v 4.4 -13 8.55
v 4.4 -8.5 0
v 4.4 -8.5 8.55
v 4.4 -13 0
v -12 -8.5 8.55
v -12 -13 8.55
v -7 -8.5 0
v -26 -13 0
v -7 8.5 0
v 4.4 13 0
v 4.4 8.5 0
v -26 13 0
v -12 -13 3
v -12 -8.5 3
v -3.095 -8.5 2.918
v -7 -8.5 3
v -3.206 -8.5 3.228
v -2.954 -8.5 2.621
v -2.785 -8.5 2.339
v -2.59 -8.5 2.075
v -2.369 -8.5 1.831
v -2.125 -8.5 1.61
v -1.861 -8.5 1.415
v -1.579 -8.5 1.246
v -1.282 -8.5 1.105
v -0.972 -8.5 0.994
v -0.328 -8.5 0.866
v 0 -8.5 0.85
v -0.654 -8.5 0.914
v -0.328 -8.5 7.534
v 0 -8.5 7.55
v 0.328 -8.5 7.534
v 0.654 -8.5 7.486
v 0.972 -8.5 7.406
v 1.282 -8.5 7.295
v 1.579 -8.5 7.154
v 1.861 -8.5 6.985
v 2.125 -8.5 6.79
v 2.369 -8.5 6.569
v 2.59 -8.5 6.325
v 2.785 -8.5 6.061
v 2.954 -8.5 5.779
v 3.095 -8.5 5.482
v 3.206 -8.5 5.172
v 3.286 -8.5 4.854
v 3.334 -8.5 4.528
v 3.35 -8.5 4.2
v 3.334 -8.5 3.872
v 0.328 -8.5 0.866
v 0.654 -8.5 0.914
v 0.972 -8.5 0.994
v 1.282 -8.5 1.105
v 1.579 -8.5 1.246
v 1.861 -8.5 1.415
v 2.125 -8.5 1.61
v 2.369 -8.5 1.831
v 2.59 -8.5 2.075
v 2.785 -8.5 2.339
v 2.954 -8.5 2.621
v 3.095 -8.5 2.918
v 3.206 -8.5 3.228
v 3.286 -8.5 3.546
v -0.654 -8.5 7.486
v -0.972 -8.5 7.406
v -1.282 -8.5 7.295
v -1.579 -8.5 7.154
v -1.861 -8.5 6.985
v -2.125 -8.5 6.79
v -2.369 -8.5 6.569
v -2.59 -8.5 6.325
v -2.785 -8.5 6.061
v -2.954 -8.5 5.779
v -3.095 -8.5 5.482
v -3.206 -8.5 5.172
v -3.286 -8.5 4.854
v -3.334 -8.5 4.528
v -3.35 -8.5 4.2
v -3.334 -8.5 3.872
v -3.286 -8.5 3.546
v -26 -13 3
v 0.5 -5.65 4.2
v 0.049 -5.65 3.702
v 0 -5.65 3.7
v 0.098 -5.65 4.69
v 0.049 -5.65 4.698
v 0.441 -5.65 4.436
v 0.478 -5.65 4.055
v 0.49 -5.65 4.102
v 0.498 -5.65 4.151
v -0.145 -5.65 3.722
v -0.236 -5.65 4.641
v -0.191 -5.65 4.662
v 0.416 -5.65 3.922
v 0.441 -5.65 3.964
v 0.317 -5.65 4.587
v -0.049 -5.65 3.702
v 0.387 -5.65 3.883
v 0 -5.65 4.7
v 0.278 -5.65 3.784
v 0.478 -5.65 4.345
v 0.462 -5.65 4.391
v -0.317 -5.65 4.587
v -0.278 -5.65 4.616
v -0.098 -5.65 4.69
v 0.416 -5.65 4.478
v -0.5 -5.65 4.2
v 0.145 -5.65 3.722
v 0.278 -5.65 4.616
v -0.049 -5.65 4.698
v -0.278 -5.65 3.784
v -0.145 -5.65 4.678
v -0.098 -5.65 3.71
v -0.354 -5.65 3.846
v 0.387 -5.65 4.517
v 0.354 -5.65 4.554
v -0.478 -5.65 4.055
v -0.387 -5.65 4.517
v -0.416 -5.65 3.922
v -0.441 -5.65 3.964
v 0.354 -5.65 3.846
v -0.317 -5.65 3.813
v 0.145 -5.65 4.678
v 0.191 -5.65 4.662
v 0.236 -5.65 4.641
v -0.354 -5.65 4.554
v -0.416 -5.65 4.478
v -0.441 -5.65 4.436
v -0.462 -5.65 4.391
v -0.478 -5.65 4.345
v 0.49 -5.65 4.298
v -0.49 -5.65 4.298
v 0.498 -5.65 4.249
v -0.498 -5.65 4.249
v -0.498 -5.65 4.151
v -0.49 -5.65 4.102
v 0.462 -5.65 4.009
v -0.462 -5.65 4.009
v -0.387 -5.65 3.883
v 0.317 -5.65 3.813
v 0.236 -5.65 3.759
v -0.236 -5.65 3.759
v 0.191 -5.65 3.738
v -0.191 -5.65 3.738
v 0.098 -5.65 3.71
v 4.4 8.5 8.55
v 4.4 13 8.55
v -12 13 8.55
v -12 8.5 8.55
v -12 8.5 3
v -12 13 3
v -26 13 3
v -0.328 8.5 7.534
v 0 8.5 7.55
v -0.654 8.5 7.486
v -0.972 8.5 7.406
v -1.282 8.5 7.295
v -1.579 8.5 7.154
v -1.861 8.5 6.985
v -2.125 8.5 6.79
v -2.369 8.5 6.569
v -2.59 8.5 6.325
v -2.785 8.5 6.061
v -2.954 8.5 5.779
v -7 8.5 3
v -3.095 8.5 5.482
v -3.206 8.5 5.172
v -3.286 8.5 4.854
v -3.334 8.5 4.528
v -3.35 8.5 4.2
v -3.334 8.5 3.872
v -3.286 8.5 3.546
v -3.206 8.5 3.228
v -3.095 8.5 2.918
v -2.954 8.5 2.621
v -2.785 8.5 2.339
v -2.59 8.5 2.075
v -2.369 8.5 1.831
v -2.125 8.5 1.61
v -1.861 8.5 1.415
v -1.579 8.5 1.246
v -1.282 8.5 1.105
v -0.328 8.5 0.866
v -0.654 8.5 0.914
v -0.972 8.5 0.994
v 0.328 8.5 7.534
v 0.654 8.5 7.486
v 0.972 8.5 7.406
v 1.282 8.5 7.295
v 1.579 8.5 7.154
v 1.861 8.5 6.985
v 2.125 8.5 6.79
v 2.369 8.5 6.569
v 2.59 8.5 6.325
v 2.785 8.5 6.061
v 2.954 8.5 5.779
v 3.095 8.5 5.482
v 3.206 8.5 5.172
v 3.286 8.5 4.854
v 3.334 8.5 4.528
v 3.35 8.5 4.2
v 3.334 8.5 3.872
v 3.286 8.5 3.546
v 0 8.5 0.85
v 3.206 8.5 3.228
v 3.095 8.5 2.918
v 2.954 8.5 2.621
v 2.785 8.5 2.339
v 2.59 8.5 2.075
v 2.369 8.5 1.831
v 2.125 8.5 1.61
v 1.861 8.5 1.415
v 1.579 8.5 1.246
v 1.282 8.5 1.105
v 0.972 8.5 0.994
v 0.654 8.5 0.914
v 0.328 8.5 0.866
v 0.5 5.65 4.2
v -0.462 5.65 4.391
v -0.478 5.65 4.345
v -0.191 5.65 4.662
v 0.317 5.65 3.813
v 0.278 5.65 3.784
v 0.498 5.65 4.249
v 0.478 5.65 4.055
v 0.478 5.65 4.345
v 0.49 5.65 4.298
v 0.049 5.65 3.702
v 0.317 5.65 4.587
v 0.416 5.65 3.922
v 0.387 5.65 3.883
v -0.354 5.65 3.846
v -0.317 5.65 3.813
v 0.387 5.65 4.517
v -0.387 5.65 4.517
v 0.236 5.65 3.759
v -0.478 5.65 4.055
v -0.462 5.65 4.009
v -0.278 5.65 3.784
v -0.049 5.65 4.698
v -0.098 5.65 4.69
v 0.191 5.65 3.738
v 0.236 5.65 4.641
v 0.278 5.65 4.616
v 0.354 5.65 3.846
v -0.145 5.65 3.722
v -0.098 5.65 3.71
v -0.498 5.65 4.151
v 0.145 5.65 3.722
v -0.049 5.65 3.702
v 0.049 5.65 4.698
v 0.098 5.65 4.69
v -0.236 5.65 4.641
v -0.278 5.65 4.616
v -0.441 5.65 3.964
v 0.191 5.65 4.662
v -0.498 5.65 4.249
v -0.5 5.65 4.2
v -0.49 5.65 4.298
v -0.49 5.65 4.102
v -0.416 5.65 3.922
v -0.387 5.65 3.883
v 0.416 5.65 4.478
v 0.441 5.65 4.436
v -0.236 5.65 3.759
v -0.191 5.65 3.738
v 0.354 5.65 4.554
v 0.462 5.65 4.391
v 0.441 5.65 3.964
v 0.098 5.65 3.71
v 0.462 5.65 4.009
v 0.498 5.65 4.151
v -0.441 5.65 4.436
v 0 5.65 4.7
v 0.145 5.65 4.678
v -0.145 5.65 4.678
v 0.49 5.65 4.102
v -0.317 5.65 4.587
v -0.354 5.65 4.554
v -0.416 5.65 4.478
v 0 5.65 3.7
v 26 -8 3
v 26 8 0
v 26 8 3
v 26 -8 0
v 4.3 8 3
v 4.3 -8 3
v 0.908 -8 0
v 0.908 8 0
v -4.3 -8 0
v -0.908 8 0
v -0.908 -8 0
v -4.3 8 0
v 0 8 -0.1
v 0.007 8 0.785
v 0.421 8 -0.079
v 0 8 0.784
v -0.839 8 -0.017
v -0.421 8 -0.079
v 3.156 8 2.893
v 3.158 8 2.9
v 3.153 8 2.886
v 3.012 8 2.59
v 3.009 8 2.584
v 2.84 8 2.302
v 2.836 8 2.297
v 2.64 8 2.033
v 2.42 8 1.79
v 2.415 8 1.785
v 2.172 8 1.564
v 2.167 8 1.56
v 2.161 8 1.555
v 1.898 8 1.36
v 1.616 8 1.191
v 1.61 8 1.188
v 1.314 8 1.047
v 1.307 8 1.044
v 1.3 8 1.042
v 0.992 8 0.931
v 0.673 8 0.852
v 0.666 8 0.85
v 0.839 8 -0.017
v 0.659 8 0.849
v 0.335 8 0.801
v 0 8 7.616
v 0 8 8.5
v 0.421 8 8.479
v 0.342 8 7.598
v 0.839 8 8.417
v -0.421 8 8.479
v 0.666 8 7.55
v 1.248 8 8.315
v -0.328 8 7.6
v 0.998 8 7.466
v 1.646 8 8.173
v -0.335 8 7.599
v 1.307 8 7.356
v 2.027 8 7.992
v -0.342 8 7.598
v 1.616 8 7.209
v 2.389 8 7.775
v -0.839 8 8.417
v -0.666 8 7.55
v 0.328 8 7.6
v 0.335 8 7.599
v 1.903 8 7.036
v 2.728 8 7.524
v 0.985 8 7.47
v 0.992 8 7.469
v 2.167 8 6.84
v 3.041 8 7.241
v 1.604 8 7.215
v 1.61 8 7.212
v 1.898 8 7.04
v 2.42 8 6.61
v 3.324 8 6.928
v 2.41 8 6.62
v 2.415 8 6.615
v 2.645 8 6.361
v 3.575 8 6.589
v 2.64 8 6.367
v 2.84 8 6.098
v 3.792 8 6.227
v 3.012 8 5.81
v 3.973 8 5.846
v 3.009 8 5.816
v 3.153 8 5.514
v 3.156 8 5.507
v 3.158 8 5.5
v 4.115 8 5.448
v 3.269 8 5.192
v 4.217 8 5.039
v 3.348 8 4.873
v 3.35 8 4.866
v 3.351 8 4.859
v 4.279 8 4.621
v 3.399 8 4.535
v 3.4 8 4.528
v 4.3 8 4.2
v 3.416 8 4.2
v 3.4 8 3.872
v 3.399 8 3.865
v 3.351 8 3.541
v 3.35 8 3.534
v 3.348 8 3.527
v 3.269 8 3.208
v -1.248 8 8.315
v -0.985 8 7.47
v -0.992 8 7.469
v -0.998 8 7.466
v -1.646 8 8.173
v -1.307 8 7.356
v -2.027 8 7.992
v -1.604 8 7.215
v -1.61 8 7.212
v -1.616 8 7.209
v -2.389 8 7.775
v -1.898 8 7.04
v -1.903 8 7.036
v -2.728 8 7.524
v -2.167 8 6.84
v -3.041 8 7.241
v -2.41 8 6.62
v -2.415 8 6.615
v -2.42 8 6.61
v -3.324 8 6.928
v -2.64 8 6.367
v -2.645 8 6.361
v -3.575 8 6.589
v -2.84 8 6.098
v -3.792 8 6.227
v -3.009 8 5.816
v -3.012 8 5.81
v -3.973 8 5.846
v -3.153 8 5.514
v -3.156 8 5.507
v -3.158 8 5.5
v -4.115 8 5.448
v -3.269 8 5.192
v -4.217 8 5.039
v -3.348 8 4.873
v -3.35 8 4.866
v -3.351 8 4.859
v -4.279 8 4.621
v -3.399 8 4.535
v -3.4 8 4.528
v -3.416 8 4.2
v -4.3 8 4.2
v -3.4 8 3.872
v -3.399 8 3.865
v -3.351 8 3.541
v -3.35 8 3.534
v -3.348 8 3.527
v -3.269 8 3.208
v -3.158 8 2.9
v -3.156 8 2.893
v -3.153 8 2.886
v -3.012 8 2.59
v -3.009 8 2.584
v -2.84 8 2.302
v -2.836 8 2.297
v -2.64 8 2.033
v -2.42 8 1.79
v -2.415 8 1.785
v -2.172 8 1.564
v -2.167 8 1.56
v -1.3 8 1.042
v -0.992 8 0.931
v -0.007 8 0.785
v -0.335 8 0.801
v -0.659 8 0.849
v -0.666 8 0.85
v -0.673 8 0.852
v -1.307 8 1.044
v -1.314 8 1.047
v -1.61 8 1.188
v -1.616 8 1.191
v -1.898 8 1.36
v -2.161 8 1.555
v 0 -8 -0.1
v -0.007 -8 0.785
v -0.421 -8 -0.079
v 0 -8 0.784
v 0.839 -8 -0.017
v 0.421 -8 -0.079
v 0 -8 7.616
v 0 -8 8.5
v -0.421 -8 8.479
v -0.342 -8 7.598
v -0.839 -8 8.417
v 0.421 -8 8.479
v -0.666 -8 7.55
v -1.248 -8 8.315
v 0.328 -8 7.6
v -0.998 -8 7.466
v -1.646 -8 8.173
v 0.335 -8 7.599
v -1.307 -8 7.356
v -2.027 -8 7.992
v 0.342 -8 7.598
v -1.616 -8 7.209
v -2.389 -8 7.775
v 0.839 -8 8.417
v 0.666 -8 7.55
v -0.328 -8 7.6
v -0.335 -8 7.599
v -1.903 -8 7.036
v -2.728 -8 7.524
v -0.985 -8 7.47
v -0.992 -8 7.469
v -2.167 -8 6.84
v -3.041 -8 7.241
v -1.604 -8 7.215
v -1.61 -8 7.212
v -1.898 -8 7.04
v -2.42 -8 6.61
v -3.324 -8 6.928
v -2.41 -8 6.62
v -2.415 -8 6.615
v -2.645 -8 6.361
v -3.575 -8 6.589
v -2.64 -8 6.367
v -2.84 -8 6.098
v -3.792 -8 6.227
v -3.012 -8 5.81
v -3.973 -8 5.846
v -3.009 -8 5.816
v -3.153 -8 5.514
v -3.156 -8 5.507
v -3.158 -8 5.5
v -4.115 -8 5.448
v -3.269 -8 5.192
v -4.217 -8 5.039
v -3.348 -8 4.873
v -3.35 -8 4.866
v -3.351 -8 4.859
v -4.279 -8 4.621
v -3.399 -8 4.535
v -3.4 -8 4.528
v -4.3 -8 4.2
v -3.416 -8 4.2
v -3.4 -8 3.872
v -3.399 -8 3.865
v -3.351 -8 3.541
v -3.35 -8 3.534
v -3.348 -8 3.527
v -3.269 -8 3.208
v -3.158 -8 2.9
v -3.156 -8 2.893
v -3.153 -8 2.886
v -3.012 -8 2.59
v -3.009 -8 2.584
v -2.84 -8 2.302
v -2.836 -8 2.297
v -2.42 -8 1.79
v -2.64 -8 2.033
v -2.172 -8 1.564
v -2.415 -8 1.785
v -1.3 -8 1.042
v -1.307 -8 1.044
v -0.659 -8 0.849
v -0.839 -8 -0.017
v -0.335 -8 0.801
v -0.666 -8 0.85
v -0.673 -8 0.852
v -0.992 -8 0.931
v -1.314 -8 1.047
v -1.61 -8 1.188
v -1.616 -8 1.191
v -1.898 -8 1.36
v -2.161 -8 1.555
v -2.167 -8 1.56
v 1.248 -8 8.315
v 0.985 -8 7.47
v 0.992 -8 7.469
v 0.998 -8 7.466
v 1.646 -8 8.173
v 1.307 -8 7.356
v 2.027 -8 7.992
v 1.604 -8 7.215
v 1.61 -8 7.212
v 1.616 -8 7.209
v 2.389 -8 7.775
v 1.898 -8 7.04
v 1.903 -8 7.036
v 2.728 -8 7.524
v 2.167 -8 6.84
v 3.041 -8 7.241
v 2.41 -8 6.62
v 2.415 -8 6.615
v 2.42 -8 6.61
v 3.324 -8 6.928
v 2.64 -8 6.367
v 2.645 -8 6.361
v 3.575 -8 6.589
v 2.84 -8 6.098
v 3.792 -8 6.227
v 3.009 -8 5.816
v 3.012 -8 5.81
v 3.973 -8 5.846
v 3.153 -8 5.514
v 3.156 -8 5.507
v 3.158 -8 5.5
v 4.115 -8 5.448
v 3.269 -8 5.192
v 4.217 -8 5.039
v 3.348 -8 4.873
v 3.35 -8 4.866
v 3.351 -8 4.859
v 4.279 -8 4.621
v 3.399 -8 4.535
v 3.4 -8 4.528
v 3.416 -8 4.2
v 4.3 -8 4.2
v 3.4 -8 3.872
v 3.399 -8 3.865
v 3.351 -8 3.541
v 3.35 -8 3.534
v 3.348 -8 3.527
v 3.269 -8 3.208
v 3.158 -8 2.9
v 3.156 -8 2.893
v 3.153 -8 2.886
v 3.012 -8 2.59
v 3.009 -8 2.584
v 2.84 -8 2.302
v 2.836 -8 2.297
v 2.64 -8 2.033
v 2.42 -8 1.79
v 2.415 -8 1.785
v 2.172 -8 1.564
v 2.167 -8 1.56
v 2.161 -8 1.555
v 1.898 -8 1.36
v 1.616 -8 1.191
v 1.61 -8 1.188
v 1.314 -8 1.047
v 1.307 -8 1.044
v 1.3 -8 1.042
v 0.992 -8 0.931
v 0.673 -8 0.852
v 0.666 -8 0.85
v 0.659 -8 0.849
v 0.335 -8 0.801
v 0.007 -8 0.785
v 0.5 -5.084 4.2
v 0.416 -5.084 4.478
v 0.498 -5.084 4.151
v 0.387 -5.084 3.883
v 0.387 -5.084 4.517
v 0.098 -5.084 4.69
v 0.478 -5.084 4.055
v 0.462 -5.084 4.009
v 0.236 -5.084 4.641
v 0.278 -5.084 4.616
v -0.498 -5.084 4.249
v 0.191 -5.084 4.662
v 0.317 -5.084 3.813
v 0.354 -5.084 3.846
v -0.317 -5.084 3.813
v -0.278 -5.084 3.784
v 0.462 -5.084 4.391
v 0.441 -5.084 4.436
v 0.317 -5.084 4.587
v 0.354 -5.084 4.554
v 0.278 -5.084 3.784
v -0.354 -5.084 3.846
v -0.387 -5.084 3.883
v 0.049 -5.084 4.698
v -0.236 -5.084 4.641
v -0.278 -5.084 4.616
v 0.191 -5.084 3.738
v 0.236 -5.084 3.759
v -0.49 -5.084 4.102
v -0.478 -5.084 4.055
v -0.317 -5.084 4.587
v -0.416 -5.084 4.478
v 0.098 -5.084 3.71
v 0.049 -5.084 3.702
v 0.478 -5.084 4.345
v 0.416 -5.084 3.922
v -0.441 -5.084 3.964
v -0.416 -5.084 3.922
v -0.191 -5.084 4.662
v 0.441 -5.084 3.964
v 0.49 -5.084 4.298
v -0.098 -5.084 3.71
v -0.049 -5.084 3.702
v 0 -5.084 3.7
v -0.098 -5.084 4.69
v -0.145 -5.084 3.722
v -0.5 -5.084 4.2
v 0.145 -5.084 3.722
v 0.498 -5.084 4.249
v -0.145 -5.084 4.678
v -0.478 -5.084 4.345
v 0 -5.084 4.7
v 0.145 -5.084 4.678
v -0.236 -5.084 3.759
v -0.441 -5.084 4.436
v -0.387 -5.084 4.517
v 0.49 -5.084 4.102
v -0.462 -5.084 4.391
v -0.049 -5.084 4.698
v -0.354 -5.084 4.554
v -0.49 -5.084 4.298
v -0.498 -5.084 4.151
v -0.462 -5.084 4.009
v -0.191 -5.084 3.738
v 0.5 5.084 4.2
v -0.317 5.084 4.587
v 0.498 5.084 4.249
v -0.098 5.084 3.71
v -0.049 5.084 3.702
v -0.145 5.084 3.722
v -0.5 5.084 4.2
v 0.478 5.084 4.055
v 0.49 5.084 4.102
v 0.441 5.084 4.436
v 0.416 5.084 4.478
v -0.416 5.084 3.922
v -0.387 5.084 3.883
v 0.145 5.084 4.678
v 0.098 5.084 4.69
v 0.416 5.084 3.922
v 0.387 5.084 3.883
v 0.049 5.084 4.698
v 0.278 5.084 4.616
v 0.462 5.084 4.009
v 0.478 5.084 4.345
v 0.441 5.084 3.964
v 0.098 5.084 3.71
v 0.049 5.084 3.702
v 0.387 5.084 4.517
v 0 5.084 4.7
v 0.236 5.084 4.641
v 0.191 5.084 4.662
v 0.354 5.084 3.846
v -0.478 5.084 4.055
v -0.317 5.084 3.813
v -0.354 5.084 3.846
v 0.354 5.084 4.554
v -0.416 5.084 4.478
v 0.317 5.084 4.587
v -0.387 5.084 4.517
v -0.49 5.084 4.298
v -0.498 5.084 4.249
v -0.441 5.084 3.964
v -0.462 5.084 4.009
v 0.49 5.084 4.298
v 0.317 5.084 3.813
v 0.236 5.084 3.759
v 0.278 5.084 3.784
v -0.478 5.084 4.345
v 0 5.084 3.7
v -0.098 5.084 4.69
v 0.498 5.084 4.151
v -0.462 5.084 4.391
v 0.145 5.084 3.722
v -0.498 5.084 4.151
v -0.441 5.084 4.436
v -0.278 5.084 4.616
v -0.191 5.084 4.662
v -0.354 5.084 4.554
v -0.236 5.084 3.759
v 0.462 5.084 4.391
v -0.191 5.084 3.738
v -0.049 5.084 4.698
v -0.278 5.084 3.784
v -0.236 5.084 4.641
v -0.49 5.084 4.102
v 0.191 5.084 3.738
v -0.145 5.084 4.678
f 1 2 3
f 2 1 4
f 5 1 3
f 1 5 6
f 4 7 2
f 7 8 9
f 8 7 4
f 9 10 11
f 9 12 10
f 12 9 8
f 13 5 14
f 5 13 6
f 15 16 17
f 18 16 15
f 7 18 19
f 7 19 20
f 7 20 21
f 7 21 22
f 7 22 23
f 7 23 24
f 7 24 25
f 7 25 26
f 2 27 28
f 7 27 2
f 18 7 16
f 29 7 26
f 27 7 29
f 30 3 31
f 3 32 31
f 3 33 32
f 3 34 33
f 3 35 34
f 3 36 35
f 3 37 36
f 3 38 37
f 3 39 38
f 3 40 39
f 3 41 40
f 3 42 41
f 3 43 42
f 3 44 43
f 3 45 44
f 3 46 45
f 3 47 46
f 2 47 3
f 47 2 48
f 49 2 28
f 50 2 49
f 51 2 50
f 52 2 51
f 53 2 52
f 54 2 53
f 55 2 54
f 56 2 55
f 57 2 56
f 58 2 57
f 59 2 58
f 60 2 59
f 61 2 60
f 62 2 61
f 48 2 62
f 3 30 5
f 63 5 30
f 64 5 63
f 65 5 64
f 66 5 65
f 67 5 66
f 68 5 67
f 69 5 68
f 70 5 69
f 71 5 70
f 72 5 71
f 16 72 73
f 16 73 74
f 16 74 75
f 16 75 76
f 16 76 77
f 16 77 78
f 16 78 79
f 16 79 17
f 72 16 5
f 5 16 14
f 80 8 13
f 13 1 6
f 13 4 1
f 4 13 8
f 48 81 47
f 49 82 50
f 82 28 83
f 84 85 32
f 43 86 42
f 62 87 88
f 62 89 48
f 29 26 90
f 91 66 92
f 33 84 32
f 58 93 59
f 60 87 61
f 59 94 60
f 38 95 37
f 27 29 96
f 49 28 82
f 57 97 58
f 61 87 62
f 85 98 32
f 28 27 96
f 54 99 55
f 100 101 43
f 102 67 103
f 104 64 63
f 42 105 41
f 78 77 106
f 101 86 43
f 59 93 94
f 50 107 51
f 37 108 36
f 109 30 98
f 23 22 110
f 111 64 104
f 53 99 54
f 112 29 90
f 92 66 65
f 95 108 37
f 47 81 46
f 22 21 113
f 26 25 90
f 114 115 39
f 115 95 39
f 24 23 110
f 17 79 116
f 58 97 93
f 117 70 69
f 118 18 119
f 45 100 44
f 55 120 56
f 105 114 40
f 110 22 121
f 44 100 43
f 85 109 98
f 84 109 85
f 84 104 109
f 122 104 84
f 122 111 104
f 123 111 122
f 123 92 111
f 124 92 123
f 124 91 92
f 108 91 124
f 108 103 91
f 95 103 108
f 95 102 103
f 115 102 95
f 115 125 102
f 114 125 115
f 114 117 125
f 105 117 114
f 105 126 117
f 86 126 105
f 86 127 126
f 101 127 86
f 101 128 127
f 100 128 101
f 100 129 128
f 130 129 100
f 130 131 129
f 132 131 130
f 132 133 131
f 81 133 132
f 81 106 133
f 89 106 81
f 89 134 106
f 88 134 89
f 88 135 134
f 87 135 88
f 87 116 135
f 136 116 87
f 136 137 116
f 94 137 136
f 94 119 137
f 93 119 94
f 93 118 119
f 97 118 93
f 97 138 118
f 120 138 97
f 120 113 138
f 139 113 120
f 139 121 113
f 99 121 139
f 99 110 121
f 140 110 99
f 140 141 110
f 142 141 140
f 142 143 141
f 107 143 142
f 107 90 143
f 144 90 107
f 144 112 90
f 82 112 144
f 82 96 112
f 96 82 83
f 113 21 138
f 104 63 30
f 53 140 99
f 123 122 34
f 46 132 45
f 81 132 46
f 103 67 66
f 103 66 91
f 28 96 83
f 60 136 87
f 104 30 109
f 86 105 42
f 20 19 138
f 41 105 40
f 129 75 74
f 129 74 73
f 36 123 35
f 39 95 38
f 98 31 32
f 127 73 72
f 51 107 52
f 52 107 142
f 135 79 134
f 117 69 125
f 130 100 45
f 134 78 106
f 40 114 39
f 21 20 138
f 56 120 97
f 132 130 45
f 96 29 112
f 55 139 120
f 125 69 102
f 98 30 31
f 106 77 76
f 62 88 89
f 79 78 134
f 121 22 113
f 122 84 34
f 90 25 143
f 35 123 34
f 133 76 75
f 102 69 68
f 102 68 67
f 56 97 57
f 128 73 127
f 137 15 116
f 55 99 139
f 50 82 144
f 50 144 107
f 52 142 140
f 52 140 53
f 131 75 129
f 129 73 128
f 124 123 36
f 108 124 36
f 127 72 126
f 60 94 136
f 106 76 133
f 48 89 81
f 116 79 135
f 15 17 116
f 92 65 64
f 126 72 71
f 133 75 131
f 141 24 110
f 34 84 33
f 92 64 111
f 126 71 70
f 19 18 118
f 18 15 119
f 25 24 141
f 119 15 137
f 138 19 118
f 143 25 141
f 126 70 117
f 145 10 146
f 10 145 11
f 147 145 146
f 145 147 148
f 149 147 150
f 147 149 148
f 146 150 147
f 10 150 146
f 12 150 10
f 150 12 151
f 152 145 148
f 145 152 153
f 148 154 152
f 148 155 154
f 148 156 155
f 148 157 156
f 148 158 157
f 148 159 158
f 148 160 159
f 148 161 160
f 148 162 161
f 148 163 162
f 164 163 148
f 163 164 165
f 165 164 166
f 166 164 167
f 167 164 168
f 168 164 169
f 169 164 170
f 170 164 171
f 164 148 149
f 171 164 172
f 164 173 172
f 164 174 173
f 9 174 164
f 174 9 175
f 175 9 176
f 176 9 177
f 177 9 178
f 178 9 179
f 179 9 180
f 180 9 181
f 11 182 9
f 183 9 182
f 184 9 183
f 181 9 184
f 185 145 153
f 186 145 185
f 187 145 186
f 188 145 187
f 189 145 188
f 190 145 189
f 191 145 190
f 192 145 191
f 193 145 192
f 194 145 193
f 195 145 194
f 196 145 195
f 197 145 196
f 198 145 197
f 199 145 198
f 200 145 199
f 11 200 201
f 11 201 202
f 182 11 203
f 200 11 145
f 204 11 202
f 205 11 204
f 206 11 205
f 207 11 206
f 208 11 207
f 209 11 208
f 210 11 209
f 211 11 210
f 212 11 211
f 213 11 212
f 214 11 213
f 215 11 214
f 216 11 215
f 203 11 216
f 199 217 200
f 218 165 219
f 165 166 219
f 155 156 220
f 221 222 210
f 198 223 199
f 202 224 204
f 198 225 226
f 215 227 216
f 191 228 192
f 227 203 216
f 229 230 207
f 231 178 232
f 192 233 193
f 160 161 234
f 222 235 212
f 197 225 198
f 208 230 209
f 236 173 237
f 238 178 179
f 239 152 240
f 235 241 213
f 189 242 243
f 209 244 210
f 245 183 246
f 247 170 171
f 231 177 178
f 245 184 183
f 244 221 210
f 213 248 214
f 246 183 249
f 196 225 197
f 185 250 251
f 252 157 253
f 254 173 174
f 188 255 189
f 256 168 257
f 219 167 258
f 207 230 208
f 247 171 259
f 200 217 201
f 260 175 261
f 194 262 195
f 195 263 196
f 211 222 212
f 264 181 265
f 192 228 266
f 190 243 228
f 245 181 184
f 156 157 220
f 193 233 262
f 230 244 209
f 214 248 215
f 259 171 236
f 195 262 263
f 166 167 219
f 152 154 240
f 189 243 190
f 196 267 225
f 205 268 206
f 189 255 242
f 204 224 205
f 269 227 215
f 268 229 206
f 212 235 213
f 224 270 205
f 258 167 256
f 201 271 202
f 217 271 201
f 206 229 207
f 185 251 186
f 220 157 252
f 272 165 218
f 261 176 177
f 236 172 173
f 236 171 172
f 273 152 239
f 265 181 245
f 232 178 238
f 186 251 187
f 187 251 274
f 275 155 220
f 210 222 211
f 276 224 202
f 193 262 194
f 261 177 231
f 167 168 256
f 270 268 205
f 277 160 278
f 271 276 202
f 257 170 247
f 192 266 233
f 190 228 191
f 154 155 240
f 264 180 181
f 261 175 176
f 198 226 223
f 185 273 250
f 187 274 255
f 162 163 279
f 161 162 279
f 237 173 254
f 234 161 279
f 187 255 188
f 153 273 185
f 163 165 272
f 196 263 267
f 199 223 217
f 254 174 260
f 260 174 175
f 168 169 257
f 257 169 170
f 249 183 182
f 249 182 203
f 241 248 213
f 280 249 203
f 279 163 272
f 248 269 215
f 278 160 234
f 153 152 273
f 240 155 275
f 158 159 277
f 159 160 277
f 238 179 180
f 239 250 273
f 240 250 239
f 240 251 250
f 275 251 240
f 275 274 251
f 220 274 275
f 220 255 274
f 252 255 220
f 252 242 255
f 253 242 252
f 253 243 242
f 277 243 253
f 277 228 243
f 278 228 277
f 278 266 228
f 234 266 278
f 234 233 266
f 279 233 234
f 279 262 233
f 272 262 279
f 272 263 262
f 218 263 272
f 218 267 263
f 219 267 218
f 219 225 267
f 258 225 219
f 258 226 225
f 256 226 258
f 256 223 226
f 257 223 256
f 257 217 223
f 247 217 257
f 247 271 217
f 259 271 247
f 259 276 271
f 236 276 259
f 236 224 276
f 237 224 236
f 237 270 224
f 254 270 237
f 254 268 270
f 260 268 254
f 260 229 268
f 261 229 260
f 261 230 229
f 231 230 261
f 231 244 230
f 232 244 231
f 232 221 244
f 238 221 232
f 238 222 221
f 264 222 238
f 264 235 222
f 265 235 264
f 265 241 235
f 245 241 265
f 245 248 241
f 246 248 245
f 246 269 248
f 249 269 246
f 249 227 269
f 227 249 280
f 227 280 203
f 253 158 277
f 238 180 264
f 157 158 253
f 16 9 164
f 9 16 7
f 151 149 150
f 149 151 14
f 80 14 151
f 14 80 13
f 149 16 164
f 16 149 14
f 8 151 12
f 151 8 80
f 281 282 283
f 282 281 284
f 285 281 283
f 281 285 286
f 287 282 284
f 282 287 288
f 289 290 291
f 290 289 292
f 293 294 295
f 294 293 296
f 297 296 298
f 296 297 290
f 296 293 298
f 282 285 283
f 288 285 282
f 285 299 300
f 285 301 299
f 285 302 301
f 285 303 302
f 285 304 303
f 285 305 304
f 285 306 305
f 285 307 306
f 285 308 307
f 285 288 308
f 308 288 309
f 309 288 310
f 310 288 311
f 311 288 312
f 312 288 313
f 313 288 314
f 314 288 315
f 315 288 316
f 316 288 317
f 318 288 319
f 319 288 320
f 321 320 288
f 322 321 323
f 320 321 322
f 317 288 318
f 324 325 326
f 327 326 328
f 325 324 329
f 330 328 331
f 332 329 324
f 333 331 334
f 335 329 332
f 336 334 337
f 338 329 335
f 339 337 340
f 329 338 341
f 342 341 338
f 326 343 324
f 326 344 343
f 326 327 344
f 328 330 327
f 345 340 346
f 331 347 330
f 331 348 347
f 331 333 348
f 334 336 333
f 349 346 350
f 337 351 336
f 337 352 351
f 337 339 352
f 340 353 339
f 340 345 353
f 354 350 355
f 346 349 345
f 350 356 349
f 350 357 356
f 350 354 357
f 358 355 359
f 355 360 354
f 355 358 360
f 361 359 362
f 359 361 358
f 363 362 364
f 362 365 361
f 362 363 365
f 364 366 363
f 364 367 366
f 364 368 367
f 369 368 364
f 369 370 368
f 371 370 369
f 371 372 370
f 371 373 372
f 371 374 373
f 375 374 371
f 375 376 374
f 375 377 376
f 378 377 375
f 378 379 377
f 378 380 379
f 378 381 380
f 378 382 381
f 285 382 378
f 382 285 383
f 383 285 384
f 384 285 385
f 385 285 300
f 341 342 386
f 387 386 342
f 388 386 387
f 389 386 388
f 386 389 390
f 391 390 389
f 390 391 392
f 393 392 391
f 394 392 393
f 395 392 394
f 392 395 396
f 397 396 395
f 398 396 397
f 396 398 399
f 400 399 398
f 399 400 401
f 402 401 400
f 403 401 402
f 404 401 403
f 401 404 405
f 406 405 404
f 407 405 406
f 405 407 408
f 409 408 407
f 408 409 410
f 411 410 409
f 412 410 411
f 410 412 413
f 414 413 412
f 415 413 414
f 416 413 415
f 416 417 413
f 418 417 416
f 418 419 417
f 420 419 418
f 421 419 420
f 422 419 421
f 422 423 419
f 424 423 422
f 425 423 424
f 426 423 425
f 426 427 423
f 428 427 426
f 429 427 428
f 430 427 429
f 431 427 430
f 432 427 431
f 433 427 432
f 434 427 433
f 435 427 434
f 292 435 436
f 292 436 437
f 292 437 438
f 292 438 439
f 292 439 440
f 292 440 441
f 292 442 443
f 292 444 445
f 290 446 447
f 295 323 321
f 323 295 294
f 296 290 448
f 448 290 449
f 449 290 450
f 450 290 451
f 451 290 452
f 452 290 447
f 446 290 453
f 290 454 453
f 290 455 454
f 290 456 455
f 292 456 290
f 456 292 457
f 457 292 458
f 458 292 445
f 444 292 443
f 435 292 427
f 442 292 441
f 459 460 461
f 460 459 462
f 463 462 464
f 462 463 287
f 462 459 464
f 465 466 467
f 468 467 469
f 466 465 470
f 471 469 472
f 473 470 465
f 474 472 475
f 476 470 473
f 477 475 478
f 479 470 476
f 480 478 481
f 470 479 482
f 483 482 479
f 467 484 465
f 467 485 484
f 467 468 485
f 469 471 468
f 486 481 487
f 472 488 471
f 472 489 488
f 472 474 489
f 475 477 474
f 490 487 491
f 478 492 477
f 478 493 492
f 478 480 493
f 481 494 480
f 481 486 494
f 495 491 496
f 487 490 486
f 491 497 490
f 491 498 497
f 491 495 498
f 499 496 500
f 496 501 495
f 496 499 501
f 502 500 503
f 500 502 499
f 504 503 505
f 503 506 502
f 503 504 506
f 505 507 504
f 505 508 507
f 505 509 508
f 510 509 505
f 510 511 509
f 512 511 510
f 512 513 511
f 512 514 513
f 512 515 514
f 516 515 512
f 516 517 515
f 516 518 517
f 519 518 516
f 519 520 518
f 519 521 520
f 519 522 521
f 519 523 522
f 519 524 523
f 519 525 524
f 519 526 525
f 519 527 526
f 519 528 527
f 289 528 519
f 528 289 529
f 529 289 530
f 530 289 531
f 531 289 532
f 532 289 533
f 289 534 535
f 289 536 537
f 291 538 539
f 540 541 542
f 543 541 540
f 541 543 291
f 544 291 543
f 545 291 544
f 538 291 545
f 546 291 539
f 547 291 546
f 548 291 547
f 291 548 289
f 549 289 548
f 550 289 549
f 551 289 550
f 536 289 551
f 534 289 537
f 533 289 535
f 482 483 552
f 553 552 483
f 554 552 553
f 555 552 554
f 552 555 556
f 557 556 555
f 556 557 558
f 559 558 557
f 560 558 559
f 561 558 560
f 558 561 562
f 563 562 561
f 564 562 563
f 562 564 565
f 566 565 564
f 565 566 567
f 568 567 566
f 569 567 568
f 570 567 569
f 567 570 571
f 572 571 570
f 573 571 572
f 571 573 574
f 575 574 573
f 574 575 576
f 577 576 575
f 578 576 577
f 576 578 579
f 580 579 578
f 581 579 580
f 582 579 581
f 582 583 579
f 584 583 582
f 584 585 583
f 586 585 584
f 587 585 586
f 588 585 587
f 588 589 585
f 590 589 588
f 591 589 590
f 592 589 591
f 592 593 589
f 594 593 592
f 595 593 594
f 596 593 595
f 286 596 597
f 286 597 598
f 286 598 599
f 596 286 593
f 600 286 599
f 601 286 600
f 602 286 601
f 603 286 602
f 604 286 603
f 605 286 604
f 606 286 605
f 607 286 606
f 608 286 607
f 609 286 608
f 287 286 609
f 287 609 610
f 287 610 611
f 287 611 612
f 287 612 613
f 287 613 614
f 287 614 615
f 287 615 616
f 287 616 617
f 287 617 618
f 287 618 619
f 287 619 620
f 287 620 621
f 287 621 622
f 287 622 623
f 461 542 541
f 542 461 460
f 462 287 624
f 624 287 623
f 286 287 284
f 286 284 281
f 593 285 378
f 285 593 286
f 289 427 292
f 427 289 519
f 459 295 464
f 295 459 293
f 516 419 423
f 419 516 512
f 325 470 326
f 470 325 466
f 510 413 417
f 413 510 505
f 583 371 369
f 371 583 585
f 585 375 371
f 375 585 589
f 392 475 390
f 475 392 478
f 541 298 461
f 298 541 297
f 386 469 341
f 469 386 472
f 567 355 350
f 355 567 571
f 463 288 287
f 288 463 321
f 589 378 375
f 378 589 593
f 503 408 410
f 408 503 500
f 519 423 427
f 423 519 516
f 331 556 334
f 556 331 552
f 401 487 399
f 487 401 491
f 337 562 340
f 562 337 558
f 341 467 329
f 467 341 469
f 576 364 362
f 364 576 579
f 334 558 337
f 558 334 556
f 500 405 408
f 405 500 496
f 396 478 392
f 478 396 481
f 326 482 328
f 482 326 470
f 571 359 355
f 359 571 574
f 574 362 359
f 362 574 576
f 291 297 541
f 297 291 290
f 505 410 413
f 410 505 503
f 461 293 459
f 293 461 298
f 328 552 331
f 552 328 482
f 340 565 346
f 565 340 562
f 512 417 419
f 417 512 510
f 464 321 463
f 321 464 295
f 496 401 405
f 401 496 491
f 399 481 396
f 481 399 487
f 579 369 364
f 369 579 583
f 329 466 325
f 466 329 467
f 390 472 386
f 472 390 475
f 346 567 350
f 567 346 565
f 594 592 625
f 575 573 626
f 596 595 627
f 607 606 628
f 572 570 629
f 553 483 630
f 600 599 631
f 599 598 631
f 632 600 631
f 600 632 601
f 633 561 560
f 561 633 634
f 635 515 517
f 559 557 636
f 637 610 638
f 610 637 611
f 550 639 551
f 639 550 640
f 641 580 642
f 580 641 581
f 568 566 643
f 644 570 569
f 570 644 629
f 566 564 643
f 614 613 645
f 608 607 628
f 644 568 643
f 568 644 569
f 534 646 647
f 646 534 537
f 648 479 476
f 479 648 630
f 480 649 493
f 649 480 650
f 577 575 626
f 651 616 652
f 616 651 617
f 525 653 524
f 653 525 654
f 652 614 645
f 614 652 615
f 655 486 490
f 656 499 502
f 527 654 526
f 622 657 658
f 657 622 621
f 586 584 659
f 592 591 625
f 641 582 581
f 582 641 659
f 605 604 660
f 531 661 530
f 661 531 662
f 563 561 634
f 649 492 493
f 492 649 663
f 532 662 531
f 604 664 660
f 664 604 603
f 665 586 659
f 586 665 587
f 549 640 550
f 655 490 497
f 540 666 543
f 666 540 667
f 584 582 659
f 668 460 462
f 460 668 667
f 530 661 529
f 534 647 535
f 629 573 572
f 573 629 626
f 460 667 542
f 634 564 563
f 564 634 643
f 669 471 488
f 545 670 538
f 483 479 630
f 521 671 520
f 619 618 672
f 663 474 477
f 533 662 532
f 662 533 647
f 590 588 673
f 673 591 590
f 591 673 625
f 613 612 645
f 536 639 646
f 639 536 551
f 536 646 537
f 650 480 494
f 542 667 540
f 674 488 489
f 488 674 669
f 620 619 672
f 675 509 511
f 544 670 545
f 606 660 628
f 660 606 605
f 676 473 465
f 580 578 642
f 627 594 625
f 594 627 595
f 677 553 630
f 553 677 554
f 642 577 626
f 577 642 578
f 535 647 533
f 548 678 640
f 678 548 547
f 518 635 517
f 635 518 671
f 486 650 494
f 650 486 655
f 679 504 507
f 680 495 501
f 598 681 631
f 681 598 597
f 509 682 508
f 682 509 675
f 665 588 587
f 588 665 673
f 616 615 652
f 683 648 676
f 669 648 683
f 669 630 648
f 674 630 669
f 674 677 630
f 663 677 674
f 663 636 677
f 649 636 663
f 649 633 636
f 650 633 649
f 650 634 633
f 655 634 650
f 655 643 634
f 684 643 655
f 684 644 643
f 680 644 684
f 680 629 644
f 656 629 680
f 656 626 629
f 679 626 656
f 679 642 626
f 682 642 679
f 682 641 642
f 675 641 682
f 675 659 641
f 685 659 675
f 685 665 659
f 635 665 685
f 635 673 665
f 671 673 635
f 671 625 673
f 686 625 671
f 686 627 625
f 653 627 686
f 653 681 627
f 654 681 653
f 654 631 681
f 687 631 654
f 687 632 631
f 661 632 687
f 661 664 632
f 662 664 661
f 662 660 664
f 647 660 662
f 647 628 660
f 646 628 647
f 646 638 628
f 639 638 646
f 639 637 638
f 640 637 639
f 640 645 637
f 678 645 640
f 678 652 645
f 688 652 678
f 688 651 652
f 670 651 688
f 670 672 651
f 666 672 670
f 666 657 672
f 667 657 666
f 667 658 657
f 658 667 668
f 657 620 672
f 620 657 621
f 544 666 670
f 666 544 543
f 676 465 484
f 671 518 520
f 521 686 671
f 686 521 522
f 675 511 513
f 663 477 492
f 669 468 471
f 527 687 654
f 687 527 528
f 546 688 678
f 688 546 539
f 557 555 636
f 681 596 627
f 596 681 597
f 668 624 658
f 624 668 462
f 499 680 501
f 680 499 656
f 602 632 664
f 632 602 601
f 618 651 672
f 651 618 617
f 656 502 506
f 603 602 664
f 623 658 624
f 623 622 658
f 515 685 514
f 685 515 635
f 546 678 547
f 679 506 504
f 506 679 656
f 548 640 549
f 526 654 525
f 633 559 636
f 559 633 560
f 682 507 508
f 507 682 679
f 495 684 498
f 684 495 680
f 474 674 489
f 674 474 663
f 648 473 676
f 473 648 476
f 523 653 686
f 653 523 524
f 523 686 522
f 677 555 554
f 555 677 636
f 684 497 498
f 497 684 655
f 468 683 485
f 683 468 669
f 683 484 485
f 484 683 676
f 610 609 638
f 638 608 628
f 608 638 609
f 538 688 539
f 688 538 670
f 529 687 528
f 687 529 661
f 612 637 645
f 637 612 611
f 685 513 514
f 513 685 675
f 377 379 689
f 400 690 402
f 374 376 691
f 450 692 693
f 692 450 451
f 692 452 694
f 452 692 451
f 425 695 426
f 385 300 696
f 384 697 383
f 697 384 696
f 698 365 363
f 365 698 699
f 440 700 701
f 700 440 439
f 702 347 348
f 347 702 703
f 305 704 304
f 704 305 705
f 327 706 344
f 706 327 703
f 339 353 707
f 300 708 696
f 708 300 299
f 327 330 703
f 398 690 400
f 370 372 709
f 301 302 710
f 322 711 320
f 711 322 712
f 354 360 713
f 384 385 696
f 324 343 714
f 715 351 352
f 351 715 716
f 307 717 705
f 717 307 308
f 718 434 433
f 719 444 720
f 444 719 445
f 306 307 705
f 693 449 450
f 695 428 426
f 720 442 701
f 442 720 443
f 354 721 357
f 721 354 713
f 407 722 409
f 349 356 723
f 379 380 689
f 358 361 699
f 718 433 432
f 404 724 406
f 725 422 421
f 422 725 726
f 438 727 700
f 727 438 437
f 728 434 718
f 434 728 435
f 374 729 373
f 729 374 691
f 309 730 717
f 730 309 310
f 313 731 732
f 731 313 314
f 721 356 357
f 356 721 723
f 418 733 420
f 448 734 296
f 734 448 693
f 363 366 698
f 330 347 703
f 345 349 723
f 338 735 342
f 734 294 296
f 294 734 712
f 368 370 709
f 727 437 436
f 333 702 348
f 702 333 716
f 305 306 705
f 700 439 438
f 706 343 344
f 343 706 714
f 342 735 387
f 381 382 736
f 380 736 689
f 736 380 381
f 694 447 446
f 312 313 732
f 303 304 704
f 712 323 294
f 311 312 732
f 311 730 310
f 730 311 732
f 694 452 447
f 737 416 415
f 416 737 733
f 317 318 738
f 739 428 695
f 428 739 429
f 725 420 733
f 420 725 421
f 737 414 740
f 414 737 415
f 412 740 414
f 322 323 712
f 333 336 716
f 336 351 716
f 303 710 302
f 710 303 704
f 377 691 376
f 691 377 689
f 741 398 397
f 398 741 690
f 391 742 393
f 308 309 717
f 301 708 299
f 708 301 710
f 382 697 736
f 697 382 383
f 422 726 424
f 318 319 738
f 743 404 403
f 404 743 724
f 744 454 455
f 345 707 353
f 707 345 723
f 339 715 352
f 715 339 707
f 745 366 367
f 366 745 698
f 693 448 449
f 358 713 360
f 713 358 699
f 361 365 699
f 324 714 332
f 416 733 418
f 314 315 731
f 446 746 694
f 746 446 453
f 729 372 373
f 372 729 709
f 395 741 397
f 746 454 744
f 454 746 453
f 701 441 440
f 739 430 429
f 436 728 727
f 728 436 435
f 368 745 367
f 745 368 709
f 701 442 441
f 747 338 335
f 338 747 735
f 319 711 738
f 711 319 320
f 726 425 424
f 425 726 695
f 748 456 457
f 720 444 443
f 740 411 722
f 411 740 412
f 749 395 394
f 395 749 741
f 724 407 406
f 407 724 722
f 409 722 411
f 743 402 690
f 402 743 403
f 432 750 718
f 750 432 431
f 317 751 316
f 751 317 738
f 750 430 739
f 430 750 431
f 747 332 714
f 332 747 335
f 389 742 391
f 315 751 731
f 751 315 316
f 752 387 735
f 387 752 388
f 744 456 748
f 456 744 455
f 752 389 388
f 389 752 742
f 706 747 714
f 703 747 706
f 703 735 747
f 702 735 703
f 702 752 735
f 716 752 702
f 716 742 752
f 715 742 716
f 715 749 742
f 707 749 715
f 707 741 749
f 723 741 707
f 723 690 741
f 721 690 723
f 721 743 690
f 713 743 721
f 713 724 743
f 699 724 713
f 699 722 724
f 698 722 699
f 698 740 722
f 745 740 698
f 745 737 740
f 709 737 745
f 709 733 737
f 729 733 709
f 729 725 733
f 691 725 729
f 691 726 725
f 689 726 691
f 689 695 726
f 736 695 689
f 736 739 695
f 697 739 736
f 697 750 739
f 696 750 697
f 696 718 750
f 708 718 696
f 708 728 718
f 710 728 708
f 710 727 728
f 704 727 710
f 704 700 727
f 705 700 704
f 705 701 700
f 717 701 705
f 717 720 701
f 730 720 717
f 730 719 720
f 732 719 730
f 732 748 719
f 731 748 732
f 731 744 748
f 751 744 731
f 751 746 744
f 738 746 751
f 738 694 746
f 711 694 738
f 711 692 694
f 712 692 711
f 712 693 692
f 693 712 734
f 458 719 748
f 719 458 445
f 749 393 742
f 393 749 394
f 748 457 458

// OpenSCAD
// Opposed cone bearings adapted from the CrowPanel folding stand.
// Units mm. Print as supplied, broad feet on the build plate.
part="test"; // test, left, right, section
gap=0.4; // normal clearance, use 0.5 if the first print fuses
$fn=64;
axis_height=4.2;
radius=3.35;
cone_depth=2.85;
axial_gap=0.5;
// Hinge axis is Y. The cheeks and socket feet all touch the bed.
module cone(y,d,clearance=0){
    translate([0,y,axis_height]) rotate([-90*d,0,0])
        cylinder(h=cone_depth+clearance*sqrt(2),
        r1=radius+clearance*sqrt(2),r2=radius-cone_depth);
}
module foot(x0,x1,y0,y1,h){
    translate([x0,y0,0]) cube([x1-x0,y1-y0,h]);
}
module left(){
    union(){
        foot(-26,-7,-13,13,3);
        // Each cheek connects to its own broad foot.
        for(d=[-1,1]){
            foot(-12,4.4,d<0?-13:8.5,d<0?-8.5:13,axis_height+radius+1);
            cone(d*8.5,-d);
        }
    }
}
module right(){
    difference(){
        union(){
            foot(7,26,-8,8,3);
            foot(0,12,-8,8,3);
            // Round top, bed-supported lower half, like the earlier stand.
            foot(-4.3,4.3,-8,8,axis_height);
            translate([0,-8,axis_height]) rotate([-90,0,0])
                cylinder(h=16,r=4.3);
        }
        for(d=[-1,1]) cone(d*8.5,-d,gap);
    }
}
if(part=="test"){left();right();}
if(part=="left")left();
if(part=="right")right();
if(part=="section")intersection(){
    union(){left();right();}
    translate([-30,-20,-1])cube([60,20,20]);
}
